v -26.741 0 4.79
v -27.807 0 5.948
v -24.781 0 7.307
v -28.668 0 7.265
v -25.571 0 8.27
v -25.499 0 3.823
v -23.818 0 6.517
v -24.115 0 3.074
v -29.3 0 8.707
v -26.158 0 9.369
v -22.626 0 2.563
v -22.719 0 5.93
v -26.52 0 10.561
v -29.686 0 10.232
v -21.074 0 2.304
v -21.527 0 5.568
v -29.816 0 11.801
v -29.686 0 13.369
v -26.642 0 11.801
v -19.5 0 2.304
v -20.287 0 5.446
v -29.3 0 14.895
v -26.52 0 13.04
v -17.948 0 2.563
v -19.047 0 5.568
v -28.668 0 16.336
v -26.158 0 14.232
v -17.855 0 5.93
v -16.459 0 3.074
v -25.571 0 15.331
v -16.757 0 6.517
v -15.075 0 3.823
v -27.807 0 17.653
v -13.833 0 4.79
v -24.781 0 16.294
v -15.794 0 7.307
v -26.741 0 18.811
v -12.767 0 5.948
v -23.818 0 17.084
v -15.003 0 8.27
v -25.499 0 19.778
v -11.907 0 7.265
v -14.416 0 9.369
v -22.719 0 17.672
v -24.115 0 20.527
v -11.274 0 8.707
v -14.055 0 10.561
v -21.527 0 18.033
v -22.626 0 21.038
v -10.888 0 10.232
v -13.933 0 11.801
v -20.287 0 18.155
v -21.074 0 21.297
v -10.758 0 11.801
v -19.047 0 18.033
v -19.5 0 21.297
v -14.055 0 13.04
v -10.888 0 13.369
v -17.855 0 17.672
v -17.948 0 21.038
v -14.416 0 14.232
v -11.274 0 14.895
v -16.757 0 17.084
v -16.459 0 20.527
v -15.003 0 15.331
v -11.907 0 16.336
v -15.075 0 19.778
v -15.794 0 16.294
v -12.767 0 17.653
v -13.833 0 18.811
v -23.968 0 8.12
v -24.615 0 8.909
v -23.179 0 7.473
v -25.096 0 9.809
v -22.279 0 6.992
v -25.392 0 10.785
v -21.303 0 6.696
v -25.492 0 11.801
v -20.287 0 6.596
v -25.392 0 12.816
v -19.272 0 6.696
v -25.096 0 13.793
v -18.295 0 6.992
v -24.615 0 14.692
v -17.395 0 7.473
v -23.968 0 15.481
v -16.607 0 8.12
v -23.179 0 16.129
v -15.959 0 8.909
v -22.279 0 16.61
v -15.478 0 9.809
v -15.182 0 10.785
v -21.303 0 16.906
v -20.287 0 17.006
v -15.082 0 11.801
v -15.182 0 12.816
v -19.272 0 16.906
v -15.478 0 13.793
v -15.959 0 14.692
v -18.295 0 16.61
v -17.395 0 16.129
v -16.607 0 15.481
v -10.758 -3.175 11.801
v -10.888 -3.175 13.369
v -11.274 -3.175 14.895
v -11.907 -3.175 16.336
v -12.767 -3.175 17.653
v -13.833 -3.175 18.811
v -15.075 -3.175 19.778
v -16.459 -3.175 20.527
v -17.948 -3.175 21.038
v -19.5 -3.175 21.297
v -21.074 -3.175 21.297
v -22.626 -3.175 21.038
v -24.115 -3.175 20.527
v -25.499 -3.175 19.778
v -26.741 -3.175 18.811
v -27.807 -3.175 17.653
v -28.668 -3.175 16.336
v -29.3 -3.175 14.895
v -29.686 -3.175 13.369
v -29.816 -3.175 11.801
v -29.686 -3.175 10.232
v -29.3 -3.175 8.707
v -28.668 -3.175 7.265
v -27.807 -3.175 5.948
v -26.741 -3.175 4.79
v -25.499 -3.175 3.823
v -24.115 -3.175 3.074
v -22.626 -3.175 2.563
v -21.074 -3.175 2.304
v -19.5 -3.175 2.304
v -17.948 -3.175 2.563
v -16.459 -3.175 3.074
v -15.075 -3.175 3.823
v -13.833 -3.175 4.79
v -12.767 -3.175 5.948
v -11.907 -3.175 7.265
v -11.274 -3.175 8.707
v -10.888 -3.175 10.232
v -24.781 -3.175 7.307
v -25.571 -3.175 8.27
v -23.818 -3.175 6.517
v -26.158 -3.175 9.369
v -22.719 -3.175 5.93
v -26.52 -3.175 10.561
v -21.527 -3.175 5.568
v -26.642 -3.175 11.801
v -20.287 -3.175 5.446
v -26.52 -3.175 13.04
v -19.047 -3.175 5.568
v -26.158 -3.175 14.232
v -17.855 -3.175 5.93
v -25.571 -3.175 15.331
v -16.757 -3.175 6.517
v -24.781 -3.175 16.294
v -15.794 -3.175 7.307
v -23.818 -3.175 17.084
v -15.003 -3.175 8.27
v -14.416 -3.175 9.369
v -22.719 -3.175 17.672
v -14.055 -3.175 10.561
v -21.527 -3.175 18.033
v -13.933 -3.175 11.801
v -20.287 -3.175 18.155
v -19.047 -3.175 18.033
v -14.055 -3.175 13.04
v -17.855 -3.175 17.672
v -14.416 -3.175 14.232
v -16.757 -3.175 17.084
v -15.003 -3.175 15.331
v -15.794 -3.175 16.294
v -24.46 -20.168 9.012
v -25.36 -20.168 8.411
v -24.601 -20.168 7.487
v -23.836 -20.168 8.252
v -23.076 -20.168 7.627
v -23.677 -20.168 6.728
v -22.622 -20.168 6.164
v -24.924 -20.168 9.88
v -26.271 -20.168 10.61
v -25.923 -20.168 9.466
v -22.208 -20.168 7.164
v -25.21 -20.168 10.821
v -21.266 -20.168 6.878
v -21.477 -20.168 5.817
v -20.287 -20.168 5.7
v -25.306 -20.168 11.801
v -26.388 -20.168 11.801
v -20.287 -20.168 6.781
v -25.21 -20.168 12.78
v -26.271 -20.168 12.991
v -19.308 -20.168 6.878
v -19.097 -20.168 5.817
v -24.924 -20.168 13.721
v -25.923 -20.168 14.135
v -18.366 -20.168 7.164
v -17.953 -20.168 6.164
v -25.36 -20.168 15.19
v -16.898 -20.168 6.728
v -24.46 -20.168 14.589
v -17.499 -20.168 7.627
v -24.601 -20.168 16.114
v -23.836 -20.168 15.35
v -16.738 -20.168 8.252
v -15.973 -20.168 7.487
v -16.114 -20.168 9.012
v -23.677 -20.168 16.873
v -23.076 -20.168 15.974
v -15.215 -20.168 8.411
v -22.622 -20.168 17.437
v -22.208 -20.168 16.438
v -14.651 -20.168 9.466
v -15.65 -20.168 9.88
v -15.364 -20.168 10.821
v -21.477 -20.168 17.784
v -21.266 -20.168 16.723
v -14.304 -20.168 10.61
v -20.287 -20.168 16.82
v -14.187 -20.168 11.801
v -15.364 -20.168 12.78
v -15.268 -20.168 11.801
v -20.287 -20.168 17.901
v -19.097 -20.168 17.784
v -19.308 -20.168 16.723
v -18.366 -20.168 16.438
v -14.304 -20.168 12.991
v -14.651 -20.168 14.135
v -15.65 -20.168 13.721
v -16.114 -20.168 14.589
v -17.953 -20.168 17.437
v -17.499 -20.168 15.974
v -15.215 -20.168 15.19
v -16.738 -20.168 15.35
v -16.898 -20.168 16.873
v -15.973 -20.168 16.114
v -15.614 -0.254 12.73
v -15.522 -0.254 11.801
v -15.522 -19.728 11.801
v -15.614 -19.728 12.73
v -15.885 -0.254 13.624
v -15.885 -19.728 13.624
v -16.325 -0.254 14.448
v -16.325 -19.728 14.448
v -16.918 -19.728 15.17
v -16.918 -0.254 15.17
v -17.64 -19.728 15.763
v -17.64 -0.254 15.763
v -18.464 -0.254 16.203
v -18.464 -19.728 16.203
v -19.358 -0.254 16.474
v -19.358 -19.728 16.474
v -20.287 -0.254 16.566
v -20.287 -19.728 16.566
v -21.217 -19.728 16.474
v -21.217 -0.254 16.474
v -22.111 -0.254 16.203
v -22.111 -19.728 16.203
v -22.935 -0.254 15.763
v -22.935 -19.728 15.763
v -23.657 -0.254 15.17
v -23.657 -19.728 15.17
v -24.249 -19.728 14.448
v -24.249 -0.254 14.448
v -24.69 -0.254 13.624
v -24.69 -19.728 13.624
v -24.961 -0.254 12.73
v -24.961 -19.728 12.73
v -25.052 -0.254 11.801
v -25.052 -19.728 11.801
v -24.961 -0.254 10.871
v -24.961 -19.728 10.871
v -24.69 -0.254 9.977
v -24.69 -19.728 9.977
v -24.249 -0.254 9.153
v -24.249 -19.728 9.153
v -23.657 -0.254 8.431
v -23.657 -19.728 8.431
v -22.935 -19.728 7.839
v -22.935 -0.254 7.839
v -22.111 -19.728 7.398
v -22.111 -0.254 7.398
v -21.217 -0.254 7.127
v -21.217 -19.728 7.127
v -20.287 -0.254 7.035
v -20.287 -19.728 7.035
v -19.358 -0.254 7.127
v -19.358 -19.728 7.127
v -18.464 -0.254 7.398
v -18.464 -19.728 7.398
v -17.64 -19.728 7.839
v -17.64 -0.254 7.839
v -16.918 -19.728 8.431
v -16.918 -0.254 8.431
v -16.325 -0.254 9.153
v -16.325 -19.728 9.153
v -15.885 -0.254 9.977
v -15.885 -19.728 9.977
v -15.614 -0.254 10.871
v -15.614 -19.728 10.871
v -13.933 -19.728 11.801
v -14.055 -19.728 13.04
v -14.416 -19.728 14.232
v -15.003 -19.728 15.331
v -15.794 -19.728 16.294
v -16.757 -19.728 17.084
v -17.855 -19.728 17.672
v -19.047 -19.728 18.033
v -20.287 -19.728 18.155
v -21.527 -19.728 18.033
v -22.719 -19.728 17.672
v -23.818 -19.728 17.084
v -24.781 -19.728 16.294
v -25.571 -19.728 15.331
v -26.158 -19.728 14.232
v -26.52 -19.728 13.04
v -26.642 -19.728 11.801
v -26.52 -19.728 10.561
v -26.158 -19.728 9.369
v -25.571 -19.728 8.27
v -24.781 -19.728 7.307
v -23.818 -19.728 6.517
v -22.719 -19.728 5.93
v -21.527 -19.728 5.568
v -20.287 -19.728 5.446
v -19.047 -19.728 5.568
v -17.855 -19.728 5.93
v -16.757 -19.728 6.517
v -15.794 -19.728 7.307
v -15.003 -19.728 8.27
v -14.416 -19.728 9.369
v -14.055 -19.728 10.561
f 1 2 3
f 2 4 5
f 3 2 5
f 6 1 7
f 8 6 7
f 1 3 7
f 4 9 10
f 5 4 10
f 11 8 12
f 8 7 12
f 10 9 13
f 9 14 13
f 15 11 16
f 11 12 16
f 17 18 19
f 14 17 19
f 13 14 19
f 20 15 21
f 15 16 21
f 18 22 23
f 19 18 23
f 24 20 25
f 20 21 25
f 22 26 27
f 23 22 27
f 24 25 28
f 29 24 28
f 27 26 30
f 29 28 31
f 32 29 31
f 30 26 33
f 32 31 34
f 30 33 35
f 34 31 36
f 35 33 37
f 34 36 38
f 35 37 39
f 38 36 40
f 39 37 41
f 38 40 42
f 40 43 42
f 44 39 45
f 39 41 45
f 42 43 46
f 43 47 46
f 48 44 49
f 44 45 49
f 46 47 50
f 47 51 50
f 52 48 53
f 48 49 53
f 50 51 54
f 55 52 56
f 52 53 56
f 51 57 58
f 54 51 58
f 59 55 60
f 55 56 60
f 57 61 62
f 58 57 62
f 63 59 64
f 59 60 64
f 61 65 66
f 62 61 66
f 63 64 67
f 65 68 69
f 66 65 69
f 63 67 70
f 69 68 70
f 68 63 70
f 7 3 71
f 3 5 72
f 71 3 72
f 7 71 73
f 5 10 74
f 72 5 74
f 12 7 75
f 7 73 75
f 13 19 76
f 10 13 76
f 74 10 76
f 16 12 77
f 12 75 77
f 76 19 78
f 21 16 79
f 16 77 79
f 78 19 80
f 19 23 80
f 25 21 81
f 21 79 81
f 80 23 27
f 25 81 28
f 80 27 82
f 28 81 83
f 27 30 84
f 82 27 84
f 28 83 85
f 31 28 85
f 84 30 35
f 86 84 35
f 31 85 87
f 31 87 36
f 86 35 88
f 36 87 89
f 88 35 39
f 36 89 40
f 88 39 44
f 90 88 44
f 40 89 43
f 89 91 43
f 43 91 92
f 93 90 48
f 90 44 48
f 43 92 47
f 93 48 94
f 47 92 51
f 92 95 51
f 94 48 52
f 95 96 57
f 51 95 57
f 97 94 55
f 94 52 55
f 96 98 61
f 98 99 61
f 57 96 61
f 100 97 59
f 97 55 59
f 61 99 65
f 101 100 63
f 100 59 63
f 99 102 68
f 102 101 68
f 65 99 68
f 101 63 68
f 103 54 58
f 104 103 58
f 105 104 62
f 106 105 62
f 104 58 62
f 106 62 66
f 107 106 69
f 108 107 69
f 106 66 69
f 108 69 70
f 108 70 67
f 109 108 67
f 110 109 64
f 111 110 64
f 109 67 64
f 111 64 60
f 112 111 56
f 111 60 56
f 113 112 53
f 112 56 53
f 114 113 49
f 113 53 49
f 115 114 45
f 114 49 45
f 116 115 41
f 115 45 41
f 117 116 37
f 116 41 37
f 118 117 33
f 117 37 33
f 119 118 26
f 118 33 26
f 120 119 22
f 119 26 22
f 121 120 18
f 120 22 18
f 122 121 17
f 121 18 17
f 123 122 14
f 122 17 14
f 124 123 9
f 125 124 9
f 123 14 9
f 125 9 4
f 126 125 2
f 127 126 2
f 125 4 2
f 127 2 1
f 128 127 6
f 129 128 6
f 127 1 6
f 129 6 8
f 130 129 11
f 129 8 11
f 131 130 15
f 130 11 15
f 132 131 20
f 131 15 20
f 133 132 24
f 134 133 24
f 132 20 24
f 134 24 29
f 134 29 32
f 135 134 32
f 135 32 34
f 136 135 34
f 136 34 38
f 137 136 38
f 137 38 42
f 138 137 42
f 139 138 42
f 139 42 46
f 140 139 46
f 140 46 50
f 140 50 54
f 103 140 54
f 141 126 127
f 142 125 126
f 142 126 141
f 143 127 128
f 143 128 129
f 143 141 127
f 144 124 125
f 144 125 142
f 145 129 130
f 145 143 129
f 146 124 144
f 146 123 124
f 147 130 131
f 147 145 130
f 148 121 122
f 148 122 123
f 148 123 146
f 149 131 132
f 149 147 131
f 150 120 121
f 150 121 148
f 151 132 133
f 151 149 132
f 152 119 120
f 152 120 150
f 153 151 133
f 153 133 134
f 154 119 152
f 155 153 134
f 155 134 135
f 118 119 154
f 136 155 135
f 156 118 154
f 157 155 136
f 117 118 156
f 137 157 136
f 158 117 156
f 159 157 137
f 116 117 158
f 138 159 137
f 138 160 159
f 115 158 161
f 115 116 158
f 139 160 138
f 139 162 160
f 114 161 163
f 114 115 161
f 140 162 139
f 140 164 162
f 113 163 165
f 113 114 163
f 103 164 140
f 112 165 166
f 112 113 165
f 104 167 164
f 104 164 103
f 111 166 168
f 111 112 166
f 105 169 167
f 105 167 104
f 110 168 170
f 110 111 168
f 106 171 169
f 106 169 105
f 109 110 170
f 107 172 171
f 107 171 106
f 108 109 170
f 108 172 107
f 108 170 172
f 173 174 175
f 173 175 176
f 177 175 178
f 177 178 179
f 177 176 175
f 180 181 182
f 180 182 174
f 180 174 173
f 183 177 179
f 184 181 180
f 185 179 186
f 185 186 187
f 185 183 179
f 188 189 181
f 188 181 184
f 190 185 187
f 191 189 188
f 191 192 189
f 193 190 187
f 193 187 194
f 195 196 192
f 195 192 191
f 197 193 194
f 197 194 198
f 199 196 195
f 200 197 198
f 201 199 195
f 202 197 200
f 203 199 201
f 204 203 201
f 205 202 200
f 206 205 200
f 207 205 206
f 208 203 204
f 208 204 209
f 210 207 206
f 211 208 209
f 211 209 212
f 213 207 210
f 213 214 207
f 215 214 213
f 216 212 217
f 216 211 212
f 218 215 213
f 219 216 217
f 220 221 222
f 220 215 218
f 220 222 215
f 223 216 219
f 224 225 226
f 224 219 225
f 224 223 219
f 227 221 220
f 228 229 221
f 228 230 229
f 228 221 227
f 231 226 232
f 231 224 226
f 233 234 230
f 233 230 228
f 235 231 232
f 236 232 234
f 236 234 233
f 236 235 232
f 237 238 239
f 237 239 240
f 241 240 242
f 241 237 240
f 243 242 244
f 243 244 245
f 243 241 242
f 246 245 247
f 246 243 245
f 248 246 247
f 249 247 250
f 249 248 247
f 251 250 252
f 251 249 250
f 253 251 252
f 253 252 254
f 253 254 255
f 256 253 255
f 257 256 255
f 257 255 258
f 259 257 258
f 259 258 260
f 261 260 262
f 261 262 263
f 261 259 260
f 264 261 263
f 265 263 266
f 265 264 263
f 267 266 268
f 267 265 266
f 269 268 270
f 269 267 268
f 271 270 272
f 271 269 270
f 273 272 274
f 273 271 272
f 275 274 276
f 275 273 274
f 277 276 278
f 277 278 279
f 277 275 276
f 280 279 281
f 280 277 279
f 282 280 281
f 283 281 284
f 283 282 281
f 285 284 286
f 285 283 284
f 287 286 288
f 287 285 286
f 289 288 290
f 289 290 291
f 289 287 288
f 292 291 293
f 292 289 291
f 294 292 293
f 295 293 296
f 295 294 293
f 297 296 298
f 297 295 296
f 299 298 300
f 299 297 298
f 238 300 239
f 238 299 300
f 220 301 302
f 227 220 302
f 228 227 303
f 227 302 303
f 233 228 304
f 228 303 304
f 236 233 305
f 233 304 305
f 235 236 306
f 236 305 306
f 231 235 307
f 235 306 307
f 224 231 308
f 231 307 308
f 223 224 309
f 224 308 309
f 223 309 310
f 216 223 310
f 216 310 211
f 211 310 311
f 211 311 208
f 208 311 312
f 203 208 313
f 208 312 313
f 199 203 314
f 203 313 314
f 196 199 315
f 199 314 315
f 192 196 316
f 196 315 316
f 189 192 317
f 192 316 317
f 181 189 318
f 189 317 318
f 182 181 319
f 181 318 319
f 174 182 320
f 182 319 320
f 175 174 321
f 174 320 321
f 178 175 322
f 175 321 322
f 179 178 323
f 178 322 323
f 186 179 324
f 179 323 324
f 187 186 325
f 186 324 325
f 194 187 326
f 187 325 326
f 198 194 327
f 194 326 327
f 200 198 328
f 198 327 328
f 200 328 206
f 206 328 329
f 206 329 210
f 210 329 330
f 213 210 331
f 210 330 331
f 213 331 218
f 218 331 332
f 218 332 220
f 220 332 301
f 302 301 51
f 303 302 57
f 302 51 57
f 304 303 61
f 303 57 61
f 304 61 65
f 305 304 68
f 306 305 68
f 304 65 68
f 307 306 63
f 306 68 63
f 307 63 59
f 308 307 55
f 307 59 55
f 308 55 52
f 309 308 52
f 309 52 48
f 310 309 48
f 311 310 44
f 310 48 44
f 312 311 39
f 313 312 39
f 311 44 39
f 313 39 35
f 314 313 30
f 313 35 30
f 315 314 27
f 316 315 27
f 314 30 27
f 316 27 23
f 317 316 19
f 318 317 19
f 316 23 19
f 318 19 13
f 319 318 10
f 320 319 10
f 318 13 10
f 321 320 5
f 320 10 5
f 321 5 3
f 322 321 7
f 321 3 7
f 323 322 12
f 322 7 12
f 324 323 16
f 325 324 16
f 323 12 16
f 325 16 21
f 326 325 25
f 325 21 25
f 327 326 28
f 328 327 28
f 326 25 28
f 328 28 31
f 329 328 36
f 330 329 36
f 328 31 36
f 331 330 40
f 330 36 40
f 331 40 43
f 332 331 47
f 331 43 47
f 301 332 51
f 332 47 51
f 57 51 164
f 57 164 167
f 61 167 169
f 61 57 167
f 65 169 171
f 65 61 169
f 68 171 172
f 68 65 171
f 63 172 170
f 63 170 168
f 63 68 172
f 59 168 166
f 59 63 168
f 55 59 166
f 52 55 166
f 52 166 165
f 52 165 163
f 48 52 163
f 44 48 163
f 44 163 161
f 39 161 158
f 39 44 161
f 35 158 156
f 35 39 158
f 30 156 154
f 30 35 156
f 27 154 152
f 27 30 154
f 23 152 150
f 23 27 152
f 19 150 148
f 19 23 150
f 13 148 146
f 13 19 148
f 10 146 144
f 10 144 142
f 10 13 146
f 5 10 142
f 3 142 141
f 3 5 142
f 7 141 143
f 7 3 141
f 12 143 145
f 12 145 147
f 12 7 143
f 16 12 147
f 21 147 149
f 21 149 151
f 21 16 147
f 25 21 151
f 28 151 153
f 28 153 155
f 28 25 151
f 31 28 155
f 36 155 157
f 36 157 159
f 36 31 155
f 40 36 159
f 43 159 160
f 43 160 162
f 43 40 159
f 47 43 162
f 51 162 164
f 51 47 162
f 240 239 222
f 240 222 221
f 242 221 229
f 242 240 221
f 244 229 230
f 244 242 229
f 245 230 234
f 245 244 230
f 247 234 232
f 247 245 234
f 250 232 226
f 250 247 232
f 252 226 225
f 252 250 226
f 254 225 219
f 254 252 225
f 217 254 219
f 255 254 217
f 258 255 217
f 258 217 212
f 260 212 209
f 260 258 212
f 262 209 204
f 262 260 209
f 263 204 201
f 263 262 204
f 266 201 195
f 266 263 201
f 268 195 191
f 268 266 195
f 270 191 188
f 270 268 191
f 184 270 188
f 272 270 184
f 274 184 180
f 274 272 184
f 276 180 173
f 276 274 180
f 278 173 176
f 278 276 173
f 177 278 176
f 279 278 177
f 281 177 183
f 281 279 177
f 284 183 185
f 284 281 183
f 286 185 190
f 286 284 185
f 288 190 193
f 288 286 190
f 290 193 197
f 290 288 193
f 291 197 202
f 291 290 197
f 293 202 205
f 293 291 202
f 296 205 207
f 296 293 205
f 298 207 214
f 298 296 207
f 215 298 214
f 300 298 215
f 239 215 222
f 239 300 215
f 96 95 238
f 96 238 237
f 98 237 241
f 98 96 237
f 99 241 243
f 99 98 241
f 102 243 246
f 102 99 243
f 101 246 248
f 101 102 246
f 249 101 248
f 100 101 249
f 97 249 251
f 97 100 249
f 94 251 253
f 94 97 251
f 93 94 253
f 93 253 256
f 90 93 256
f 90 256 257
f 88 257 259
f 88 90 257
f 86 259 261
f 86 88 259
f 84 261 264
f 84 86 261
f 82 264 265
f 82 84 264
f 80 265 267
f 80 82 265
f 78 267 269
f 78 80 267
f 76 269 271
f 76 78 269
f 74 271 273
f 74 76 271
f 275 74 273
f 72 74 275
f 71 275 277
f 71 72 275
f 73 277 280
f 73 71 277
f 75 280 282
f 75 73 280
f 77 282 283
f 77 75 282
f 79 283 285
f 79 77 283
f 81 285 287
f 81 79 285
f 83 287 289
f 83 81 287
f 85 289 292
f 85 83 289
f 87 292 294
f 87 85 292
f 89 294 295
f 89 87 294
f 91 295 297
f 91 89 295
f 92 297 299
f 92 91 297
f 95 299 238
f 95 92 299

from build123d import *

# Parameters (mm, degrees)
F0_R     = 6.3546461802
F0_R_2   = 4.7651897048
F1_DEPTH = 20.1676
F0_R_3   = 9.5290040224
F2_DEPTH = 3.175
F3_SIZE2 = 0.4399409051
F3_SIZE  = 0.254
F4_SIZE2 = 0.4399409051
F4_SIZE  = 0.254
F5_SIZE2 = 0.4399409051
F5_SIZE  = 0.254


with BuildPart() as f1:
    # F0 (on Front) → F1 (new body)
    with BuildSketch(Plane.XZ):
        with Locations((-20.2871672809, 11.8006402627)):
            Circle(F0_R)
        with Locations((-20.2871672809, 11.8006402627)):
            Circle(F0_R_2, mode=Mode.SUBTRACT)
    extrude(amount=F1_DEPTH)

    # F3
    f3_edges = [f1.edges().sort_by_distance(p)[0] for p in [
        (-26.641813, -20.1676, 11.80064),
    ]]
    f3_side = f1.faces().sort_by_distance((-26.462077, -20.1676, 11.80064))[0]
    chamfer(f3_edges, length=F3_SIZE, length2=F3_SIZE2, reference=f3_side)

    # F4
    f4_edges = [f1.edges().sort_by_distance(p)[0] for p in [
        (-25.052357, -20.1676, 11.80064),
    ]]
    f4_side = f1.faces().sort_by_distance((-26.215261, -20.1676, 11.80064))[0]
    chamfer(f4_edges, length=F4_SIZE, length2=F4_SIZE2, reference=f4_side)

    # F5
    f5_edges = [f1.edges().sort_by_distance(p)[0] for p in [
        (-25.052357, 0, 11.80064),
    ]]
    f5_side = f1.faces().sort_by_distance((-25.052357, -9.86383, 11.80064))[0]
    chamfer(f5_edges, length=F5_SIZE, length2=F5_SIZE2, reference=f5_side)


with BuildPart() as f2:
    # F0 (on Front) → F2 (new body)
    with BuildSketch(Plane.XZ):
        with Locations((-20.2871672809, 11.8006402627)):
            Circle(F0_R_3)
        with Locations((-20.2871672809, 11.8006402627)):
            Circle(F0_R, mode=Mode.SUBTRACT)
    extrude(amount=F2_DEPTH)


solid = Compound([f1.part, f2.part])
